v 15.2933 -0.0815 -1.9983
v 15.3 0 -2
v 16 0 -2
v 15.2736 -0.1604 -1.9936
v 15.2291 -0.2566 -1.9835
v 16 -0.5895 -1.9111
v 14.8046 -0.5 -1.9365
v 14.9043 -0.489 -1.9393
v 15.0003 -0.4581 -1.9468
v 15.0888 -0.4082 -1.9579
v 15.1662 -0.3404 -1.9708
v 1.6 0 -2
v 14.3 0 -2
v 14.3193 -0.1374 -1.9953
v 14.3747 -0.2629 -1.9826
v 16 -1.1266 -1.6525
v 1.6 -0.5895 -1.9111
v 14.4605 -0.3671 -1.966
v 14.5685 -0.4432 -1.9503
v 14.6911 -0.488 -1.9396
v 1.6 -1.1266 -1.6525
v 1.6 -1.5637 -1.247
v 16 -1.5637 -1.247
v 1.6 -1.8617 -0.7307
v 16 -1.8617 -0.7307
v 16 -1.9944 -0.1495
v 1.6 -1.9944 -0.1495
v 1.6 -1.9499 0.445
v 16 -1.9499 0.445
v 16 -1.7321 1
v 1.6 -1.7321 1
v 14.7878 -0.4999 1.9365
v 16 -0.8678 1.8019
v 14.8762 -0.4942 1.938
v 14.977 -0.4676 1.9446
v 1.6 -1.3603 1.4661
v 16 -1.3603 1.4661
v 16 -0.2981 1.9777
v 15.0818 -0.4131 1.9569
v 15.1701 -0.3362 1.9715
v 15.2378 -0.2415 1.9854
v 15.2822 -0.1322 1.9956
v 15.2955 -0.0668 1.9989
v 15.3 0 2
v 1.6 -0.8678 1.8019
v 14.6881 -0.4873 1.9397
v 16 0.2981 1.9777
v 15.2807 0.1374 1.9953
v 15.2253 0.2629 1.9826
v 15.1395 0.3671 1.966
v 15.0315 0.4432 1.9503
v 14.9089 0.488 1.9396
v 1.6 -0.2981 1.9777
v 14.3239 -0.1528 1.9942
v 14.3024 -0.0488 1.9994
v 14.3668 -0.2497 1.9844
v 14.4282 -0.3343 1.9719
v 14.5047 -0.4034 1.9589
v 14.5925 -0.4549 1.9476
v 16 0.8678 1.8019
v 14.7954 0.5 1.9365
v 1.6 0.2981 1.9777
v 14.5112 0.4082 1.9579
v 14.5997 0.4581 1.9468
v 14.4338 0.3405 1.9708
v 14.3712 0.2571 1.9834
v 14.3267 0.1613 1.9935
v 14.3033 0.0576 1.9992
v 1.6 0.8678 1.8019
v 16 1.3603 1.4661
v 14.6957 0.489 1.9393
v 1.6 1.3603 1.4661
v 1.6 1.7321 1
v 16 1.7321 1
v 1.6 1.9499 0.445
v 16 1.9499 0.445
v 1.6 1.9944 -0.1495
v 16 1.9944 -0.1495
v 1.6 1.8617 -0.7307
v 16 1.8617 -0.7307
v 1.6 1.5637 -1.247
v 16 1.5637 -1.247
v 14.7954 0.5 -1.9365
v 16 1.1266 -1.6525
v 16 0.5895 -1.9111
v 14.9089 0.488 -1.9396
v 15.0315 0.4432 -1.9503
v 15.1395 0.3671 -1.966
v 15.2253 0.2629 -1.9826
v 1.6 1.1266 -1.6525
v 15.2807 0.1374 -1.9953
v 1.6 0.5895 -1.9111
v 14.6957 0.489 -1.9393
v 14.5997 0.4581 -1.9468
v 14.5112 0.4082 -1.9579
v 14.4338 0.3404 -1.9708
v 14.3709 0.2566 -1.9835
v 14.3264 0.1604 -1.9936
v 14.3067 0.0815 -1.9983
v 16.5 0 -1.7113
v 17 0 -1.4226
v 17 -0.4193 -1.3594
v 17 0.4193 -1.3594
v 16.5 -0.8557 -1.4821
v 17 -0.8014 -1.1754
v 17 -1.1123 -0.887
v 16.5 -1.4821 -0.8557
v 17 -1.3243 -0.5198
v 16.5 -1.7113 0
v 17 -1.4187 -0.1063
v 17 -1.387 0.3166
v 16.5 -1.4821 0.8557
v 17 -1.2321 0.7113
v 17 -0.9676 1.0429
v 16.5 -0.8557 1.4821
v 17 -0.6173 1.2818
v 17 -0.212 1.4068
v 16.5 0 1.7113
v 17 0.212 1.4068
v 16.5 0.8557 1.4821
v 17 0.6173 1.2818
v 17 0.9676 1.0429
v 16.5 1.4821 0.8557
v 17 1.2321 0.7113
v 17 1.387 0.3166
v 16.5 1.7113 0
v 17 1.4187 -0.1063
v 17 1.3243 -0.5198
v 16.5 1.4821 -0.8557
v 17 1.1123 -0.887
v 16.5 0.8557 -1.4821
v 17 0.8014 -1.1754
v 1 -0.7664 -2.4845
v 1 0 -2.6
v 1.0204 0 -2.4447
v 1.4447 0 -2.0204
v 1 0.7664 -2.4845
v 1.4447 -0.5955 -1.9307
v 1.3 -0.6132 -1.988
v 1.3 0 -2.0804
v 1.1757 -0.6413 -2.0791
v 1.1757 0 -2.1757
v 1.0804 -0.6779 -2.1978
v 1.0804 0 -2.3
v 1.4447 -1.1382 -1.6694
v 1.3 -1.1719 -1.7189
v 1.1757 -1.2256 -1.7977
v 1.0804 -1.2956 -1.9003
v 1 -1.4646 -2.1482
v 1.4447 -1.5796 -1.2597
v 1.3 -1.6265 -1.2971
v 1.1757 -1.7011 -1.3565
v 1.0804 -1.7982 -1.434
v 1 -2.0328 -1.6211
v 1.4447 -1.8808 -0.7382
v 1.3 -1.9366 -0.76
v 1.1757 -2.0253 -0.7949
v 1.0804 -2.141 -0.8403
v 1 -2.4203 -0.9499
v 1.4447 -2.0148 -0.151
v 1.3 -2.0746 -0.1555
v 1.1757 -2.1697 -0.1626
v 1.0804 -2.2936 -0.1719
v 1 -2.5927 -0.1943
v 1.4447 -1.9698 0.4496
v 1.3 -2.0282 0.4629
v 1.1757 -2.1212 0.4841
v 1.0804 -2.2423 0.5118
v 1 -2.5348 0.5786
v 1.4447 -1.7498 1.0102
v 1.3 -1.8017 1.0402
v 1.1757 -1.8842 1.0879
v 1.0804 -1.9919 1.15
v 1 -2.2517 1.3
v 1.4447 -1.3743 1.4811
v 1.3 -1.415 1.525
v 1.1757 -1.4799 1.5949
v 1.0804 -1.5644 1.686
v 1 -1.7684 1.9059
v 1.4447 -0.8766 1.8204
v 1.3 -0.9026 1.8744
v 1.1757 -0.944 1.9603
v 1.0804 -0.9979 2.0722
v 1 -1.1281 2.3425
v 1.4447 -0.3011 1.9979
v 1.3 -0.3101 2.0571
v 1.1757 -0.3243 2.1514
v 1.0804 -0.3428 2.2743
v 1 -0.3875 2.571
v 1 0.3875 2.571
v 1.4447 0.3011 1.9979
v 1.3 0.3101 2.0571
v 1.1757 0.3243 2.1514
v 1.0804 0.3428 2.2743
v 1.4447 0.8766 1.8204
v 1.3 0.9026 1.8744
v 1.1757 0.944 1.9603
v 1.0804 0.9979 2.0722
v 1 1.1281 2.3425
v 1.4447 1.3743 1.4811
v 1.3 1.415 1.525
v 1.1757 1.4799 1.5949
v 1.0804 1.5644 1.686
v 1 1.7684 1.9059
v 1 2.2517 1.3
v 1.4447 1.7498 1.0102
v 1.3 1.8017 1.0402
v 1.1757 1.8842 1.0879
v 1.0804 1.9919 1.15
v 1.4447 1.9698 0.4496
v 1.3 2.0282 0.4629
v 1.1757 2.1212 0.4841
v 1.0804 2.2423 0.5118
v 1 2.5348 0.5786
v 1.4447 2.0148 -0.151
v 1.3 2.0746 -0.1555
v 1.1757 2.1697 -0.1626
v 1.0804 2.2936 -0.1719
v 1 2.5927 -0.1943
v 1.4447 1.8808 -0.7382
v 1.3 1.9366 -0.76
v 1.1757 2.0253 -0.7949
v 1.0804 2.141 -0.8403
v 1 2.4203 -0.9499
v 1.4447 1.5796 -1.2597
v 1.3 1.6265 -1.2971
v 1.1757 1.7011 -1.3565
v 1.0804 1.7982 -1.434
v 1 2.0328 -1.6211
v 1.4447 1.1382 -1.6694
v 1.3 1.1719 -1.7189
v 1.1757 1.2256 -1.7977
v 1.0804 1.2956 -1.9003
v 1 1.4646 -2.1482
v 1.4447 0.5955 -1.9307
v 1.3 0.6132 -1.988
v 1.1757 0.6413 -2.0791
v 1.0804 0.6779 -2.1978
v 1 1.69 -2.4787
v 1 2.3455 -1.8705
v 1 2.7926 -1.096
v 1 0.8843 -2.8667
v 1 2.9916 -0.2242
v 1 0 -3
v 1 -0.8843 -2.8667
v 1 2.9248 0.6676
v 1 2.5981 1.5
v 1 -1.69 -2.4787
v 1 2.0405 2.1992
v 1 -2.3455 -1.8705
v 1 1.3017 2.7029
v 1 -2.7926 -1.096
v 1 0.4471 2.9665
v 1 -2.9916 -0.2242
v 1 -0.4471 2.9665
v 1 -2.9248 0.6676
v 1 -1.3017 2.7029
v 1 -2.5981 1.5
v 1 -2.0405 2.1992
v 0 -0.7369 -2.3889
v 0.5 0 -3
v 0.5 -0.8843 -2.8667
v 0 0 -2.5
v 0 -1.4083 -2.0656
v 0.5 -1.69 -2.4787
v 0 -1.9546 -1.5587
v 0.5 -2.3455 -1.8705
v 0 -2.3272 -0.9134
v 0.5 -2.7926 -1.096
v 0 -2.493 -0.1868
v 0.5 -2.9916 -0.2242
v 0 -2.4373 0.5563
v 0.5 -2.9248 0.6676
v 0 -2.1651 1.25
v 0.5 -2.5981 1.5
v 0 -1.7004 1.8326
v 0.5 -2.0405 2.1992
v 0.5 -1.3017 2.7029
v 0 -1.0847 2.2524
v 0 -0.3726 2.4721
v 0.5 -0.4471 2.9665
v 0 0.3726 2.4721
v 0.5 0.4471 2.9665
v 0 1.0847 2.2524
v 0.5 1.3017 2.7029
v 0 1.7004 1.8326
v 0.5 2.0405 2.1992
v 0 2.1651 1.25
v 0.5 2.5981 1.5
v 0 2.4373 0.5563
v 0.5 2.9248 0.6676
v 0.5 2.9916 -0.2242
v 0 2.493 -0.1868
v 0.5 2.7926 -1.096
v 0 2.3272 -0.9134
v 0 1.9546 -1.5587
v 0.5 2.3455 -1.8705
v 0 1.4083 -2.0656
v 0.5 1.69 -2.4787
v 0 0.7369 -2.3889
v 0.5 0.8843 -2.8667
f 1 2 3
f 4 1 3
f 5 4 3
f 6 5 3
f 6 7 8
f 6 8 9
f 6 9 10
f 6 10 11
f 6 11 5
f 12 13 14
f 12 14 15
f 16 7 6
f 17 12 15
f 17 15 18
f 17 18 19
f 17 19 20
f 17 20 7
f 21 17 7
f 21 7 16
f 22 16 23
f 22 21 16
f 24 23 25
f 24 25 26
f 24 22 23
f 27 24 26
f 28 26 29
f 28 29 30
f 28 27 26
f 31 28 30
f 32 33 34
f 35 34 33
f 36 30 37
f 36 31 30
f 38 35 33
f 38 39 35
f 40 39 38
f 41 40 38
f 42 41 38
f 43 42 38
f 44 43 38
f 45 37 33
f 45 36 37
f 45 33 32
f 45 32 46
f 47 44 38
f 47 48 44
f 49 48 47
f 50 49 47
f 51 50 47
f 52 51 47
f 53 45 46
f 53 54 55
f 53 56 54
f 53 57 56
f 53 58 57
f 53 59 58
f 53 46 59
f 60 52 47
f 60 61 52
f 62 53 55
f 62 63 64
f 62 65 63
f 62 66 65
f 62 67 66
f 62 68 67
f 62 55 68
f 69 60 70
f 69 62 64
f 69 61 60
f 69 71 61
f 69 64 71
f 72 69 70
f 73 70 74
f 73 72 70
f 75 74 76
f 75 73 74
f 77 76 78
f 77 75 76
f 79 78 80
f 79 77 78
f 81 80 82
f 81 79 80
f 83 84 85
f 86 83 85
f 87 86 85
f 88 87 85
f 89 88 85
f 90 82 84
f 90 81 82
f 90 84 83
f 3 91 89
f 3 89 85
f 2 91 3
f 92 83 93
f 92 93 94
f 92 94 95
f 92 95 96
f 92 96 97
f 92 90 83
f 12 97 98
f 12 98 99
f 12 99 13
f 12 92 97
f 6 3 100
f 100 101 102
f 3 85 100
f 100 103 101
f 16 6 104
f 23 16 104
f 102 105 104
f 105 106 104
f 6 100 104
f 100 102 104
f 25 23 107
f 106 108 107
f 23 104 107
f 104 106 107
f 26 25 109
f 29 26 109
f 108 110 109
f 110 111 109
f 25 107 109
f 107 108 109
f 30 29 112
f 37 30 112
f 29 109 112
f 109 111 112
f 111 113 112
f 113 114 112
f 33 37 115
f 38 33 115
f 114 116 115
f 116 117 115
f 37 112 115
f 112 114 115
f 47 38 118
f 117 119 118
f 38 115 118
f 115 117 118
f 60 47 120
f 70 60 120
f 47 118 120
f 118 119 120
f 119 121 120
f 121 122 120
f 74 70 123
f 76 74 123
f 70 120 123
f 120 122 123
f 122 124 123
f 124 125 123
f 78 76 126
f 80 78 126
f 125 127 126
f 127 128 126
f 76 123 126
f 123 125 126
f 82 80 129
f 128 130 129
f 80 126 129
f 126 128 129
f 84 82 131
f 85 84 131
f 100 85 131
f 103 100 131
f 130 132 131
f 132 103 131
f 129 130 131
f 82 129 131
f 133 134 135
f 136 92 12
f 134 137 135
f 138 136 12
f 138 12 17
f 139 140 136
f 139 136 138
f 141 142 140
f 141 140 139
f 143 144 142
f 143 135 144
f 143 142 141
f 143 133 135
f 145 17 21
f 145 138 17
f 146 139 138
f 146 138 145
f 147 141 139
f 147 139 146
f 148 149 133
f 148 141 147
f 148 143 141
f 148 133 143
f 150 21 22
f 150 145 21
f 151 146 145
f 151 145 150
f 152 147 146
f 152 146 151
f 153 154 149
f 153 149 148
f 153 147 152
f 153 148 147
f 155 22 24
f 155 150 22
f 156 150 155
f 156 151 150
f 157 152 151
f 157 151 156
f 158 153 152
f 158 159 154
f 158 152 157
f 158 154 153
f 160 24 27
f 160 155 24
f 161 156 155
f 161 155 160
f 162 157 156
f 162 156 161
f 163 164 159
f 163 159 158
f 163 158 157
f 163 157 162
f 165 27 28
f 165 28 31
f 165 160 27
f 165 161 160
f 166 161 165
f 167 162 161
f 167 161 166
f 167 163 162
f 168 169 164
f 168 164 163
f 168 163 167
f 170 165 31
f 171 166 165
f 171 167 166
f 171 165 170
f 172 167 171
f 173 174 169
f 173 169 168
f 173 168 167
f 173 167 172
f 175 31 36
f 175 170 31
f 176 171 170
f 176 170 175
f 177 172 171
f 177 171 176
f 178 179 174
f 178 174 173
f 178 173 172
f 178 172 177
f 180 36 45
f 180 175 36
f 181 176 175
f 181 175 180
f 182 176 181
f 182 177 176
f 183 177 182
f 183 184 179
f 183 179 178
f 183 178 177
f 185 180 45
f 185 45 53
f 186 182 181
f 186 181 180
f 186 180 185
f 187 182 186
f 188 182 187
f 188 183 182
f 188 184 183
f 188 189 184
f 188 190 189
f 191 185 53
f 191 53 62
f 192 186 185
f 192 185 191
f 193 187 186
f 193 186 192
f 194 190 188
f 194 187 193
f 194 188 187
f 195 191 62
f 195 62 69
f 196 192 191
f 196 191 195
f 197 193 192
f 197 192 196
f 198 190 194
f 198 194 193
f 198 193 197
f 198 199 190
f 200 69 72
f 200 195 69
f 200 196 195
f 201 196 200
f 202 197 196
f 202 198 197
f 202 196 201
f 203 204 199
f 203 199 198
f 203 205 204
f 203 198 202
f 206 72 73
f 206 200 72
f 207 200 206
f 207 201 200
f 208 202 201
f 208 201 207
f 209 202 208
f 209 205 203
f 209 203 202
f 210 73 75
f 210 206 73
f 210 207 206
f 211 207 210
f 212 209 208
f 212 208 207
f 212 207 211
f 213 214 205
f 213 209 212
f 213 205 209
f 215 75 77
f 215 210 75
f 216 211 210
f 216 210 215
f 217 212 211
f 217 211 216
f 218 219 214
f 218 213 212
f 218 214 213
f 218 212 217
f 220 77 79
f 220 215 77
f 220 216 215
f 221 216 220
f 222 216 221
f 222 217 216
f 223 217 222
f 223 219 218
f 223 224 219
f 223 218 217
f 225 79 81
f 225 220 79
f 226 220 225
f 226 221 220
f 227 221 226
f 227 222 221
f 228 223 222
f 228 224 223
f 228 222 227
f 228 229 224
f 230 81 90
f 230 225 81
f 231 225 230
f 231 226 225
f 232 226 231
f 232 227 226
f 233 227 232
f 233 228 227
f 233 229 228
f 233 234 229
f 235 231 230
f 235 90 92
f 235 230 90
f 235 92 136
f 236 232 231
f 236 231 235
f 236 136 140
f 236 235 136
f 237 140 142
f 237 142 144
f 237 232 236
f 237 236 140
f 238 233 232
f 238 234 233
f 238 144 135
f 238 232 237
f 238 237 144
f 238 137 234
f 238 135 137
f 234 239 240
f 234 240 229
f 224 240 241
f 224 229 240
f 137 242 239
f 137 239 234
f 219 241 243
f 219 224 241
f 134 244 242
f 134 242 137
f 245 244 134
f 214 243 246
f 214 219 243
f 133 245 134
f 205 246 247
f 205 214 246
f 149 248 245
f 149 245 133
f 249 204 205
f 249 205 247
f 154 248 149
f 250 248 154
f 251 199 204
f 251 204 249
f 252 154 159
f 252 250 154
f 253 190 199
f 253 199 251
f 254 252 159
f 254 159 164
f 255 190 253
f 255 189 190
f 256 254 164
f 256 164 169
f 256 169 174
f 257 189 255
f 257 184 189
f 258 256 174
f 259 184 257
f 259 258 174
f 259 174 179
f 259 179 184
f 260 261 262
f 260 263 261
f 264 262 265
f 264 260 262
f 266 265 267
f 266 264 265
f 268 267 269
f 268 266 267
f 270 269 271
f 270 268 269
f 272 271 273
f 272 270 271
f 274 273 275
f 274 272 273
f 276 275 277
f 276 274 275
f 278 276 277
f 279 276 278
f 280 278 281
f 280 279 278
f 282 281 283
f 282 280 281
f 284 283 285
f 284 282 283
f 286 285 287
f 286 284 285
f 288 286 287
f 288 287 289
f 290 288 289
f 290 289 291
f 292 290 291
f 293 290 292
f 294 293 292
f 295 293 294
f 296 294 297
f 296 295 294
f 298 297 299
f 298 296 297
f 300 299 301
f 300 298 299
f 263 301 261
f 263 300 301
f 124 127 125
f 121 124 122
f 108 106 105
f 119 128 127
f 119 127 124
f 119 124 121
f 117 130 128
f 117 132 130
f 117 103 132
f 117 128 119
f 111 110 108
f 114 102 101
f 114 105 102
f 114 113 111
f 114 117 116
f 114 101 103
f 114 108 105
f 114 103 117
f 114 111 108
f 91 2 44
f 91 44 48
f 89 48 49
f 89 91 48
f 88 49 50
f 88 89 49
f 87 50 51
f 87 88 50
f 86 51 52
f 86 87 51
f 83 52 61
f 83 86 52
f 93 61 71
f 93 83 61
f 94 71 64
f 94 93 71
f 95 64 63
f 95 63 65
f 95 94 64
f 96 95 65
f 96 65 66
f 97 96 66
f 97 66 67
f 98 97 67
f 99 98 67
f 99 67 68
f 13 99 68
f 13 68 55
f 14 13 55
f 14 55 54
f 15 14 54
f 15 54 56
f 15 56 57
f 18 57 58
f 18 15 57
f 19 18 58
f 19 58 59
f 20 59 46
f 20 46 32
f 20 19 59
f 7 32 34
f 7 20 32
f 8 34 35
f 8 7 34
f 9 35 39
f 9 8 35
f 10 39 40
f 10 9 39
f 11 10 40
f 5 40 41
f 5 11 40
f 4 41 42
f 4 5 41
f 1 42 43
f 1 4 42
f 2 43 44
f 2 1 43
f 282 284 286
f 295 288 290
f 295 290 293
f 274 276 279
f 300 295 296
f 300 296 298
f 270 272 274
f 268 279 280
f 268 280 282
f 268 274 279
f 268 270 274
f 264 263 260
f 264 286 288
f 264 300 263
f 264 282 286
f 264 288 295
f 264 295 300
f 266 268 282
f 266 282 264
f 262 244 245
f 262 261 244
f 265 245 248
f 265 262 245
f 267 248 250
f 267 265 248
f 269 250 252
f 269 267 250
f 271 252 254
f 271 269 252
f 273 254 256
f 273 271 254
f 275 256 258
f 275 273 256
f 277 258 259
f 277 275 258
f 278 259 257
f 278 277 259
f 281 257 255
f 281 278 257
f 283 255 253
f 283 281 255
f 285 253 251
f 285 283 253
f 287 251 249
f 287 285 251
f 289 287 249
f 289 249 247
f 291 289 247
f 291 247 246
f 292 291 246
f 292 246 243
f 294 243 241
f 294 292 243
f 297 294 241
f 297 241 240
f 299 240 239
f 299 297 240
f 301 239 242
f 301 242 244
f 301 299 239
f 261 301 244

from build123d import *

# Parameters (mm, degrees)
CUT_EXTRUDE_1_DEPTH      = 18.521415468
CUT_EXTRUDE_1_DEPTH_BACK = 18.521415468
SKETCH_2_R               = 0.5
FILLET_1_R               = 0.6
CHAMFER_1_SIZE           = 1
CHAMFER_1_SIZE2          = 0.577350269


with BuildPart() as part:
    # 草图1 → Revolve 549 (revolve)
    with BuildSketch(Plane.XY, mode=Mode.PRIVATE) as revolve_549_sk:
        Polygon((0, 0), (17, 0), (17, 2), (1, 2), (1, 3), (0.5, 3), (0, 2.5), align=None)
    revolve(revolve_549_sk.sketch.rotate(Axis((0, 0, 0), (-1, 0, 0)), 90), axis=Axis((0, 0, 0), (-1, 0, 0)))

    # 草图2 → 切除-拉伸1 (cut, two sides: drawn at the far end of the back side and taken through both)
    with BuildSketch(Plane.XY.offset(-CUT_EXTRUDE_1_DEPTH_BACK)):
        with Locations((14.8, 0)):
            Circle(SKETCH_2_R)
    extrude(amount=CUT_EXTRUDE_1_DEPTH + CUT_EXTRUDE_1_DEPTH_BACK, mode=Mode.SUBTRACT)

    # 圆角1
    fillet_1_edges = [part.edges().sort_by_distance(p)[0] for p in [
        (1, 0, 2),
    ]]
    fillet(fillet_1_edges, radius=FILLET_1_R)

    # 倒角1
    chamfer_1_edges = [part.edges().sort_by_distance(p)[0] for p in [
        (17, 0, 2),
    ]]
    chamfer_1_side = [part.faces().sort_by_distance(p)[0] for p in [
        (9.3, 0, 2),
    ]]
    chamfer(chamfer_1_edges, length=CHAMFER_1_SIZE, length2=CHAMFER_1_SIZE2, reference=chamfer_1_side[0])


solid = part.part
